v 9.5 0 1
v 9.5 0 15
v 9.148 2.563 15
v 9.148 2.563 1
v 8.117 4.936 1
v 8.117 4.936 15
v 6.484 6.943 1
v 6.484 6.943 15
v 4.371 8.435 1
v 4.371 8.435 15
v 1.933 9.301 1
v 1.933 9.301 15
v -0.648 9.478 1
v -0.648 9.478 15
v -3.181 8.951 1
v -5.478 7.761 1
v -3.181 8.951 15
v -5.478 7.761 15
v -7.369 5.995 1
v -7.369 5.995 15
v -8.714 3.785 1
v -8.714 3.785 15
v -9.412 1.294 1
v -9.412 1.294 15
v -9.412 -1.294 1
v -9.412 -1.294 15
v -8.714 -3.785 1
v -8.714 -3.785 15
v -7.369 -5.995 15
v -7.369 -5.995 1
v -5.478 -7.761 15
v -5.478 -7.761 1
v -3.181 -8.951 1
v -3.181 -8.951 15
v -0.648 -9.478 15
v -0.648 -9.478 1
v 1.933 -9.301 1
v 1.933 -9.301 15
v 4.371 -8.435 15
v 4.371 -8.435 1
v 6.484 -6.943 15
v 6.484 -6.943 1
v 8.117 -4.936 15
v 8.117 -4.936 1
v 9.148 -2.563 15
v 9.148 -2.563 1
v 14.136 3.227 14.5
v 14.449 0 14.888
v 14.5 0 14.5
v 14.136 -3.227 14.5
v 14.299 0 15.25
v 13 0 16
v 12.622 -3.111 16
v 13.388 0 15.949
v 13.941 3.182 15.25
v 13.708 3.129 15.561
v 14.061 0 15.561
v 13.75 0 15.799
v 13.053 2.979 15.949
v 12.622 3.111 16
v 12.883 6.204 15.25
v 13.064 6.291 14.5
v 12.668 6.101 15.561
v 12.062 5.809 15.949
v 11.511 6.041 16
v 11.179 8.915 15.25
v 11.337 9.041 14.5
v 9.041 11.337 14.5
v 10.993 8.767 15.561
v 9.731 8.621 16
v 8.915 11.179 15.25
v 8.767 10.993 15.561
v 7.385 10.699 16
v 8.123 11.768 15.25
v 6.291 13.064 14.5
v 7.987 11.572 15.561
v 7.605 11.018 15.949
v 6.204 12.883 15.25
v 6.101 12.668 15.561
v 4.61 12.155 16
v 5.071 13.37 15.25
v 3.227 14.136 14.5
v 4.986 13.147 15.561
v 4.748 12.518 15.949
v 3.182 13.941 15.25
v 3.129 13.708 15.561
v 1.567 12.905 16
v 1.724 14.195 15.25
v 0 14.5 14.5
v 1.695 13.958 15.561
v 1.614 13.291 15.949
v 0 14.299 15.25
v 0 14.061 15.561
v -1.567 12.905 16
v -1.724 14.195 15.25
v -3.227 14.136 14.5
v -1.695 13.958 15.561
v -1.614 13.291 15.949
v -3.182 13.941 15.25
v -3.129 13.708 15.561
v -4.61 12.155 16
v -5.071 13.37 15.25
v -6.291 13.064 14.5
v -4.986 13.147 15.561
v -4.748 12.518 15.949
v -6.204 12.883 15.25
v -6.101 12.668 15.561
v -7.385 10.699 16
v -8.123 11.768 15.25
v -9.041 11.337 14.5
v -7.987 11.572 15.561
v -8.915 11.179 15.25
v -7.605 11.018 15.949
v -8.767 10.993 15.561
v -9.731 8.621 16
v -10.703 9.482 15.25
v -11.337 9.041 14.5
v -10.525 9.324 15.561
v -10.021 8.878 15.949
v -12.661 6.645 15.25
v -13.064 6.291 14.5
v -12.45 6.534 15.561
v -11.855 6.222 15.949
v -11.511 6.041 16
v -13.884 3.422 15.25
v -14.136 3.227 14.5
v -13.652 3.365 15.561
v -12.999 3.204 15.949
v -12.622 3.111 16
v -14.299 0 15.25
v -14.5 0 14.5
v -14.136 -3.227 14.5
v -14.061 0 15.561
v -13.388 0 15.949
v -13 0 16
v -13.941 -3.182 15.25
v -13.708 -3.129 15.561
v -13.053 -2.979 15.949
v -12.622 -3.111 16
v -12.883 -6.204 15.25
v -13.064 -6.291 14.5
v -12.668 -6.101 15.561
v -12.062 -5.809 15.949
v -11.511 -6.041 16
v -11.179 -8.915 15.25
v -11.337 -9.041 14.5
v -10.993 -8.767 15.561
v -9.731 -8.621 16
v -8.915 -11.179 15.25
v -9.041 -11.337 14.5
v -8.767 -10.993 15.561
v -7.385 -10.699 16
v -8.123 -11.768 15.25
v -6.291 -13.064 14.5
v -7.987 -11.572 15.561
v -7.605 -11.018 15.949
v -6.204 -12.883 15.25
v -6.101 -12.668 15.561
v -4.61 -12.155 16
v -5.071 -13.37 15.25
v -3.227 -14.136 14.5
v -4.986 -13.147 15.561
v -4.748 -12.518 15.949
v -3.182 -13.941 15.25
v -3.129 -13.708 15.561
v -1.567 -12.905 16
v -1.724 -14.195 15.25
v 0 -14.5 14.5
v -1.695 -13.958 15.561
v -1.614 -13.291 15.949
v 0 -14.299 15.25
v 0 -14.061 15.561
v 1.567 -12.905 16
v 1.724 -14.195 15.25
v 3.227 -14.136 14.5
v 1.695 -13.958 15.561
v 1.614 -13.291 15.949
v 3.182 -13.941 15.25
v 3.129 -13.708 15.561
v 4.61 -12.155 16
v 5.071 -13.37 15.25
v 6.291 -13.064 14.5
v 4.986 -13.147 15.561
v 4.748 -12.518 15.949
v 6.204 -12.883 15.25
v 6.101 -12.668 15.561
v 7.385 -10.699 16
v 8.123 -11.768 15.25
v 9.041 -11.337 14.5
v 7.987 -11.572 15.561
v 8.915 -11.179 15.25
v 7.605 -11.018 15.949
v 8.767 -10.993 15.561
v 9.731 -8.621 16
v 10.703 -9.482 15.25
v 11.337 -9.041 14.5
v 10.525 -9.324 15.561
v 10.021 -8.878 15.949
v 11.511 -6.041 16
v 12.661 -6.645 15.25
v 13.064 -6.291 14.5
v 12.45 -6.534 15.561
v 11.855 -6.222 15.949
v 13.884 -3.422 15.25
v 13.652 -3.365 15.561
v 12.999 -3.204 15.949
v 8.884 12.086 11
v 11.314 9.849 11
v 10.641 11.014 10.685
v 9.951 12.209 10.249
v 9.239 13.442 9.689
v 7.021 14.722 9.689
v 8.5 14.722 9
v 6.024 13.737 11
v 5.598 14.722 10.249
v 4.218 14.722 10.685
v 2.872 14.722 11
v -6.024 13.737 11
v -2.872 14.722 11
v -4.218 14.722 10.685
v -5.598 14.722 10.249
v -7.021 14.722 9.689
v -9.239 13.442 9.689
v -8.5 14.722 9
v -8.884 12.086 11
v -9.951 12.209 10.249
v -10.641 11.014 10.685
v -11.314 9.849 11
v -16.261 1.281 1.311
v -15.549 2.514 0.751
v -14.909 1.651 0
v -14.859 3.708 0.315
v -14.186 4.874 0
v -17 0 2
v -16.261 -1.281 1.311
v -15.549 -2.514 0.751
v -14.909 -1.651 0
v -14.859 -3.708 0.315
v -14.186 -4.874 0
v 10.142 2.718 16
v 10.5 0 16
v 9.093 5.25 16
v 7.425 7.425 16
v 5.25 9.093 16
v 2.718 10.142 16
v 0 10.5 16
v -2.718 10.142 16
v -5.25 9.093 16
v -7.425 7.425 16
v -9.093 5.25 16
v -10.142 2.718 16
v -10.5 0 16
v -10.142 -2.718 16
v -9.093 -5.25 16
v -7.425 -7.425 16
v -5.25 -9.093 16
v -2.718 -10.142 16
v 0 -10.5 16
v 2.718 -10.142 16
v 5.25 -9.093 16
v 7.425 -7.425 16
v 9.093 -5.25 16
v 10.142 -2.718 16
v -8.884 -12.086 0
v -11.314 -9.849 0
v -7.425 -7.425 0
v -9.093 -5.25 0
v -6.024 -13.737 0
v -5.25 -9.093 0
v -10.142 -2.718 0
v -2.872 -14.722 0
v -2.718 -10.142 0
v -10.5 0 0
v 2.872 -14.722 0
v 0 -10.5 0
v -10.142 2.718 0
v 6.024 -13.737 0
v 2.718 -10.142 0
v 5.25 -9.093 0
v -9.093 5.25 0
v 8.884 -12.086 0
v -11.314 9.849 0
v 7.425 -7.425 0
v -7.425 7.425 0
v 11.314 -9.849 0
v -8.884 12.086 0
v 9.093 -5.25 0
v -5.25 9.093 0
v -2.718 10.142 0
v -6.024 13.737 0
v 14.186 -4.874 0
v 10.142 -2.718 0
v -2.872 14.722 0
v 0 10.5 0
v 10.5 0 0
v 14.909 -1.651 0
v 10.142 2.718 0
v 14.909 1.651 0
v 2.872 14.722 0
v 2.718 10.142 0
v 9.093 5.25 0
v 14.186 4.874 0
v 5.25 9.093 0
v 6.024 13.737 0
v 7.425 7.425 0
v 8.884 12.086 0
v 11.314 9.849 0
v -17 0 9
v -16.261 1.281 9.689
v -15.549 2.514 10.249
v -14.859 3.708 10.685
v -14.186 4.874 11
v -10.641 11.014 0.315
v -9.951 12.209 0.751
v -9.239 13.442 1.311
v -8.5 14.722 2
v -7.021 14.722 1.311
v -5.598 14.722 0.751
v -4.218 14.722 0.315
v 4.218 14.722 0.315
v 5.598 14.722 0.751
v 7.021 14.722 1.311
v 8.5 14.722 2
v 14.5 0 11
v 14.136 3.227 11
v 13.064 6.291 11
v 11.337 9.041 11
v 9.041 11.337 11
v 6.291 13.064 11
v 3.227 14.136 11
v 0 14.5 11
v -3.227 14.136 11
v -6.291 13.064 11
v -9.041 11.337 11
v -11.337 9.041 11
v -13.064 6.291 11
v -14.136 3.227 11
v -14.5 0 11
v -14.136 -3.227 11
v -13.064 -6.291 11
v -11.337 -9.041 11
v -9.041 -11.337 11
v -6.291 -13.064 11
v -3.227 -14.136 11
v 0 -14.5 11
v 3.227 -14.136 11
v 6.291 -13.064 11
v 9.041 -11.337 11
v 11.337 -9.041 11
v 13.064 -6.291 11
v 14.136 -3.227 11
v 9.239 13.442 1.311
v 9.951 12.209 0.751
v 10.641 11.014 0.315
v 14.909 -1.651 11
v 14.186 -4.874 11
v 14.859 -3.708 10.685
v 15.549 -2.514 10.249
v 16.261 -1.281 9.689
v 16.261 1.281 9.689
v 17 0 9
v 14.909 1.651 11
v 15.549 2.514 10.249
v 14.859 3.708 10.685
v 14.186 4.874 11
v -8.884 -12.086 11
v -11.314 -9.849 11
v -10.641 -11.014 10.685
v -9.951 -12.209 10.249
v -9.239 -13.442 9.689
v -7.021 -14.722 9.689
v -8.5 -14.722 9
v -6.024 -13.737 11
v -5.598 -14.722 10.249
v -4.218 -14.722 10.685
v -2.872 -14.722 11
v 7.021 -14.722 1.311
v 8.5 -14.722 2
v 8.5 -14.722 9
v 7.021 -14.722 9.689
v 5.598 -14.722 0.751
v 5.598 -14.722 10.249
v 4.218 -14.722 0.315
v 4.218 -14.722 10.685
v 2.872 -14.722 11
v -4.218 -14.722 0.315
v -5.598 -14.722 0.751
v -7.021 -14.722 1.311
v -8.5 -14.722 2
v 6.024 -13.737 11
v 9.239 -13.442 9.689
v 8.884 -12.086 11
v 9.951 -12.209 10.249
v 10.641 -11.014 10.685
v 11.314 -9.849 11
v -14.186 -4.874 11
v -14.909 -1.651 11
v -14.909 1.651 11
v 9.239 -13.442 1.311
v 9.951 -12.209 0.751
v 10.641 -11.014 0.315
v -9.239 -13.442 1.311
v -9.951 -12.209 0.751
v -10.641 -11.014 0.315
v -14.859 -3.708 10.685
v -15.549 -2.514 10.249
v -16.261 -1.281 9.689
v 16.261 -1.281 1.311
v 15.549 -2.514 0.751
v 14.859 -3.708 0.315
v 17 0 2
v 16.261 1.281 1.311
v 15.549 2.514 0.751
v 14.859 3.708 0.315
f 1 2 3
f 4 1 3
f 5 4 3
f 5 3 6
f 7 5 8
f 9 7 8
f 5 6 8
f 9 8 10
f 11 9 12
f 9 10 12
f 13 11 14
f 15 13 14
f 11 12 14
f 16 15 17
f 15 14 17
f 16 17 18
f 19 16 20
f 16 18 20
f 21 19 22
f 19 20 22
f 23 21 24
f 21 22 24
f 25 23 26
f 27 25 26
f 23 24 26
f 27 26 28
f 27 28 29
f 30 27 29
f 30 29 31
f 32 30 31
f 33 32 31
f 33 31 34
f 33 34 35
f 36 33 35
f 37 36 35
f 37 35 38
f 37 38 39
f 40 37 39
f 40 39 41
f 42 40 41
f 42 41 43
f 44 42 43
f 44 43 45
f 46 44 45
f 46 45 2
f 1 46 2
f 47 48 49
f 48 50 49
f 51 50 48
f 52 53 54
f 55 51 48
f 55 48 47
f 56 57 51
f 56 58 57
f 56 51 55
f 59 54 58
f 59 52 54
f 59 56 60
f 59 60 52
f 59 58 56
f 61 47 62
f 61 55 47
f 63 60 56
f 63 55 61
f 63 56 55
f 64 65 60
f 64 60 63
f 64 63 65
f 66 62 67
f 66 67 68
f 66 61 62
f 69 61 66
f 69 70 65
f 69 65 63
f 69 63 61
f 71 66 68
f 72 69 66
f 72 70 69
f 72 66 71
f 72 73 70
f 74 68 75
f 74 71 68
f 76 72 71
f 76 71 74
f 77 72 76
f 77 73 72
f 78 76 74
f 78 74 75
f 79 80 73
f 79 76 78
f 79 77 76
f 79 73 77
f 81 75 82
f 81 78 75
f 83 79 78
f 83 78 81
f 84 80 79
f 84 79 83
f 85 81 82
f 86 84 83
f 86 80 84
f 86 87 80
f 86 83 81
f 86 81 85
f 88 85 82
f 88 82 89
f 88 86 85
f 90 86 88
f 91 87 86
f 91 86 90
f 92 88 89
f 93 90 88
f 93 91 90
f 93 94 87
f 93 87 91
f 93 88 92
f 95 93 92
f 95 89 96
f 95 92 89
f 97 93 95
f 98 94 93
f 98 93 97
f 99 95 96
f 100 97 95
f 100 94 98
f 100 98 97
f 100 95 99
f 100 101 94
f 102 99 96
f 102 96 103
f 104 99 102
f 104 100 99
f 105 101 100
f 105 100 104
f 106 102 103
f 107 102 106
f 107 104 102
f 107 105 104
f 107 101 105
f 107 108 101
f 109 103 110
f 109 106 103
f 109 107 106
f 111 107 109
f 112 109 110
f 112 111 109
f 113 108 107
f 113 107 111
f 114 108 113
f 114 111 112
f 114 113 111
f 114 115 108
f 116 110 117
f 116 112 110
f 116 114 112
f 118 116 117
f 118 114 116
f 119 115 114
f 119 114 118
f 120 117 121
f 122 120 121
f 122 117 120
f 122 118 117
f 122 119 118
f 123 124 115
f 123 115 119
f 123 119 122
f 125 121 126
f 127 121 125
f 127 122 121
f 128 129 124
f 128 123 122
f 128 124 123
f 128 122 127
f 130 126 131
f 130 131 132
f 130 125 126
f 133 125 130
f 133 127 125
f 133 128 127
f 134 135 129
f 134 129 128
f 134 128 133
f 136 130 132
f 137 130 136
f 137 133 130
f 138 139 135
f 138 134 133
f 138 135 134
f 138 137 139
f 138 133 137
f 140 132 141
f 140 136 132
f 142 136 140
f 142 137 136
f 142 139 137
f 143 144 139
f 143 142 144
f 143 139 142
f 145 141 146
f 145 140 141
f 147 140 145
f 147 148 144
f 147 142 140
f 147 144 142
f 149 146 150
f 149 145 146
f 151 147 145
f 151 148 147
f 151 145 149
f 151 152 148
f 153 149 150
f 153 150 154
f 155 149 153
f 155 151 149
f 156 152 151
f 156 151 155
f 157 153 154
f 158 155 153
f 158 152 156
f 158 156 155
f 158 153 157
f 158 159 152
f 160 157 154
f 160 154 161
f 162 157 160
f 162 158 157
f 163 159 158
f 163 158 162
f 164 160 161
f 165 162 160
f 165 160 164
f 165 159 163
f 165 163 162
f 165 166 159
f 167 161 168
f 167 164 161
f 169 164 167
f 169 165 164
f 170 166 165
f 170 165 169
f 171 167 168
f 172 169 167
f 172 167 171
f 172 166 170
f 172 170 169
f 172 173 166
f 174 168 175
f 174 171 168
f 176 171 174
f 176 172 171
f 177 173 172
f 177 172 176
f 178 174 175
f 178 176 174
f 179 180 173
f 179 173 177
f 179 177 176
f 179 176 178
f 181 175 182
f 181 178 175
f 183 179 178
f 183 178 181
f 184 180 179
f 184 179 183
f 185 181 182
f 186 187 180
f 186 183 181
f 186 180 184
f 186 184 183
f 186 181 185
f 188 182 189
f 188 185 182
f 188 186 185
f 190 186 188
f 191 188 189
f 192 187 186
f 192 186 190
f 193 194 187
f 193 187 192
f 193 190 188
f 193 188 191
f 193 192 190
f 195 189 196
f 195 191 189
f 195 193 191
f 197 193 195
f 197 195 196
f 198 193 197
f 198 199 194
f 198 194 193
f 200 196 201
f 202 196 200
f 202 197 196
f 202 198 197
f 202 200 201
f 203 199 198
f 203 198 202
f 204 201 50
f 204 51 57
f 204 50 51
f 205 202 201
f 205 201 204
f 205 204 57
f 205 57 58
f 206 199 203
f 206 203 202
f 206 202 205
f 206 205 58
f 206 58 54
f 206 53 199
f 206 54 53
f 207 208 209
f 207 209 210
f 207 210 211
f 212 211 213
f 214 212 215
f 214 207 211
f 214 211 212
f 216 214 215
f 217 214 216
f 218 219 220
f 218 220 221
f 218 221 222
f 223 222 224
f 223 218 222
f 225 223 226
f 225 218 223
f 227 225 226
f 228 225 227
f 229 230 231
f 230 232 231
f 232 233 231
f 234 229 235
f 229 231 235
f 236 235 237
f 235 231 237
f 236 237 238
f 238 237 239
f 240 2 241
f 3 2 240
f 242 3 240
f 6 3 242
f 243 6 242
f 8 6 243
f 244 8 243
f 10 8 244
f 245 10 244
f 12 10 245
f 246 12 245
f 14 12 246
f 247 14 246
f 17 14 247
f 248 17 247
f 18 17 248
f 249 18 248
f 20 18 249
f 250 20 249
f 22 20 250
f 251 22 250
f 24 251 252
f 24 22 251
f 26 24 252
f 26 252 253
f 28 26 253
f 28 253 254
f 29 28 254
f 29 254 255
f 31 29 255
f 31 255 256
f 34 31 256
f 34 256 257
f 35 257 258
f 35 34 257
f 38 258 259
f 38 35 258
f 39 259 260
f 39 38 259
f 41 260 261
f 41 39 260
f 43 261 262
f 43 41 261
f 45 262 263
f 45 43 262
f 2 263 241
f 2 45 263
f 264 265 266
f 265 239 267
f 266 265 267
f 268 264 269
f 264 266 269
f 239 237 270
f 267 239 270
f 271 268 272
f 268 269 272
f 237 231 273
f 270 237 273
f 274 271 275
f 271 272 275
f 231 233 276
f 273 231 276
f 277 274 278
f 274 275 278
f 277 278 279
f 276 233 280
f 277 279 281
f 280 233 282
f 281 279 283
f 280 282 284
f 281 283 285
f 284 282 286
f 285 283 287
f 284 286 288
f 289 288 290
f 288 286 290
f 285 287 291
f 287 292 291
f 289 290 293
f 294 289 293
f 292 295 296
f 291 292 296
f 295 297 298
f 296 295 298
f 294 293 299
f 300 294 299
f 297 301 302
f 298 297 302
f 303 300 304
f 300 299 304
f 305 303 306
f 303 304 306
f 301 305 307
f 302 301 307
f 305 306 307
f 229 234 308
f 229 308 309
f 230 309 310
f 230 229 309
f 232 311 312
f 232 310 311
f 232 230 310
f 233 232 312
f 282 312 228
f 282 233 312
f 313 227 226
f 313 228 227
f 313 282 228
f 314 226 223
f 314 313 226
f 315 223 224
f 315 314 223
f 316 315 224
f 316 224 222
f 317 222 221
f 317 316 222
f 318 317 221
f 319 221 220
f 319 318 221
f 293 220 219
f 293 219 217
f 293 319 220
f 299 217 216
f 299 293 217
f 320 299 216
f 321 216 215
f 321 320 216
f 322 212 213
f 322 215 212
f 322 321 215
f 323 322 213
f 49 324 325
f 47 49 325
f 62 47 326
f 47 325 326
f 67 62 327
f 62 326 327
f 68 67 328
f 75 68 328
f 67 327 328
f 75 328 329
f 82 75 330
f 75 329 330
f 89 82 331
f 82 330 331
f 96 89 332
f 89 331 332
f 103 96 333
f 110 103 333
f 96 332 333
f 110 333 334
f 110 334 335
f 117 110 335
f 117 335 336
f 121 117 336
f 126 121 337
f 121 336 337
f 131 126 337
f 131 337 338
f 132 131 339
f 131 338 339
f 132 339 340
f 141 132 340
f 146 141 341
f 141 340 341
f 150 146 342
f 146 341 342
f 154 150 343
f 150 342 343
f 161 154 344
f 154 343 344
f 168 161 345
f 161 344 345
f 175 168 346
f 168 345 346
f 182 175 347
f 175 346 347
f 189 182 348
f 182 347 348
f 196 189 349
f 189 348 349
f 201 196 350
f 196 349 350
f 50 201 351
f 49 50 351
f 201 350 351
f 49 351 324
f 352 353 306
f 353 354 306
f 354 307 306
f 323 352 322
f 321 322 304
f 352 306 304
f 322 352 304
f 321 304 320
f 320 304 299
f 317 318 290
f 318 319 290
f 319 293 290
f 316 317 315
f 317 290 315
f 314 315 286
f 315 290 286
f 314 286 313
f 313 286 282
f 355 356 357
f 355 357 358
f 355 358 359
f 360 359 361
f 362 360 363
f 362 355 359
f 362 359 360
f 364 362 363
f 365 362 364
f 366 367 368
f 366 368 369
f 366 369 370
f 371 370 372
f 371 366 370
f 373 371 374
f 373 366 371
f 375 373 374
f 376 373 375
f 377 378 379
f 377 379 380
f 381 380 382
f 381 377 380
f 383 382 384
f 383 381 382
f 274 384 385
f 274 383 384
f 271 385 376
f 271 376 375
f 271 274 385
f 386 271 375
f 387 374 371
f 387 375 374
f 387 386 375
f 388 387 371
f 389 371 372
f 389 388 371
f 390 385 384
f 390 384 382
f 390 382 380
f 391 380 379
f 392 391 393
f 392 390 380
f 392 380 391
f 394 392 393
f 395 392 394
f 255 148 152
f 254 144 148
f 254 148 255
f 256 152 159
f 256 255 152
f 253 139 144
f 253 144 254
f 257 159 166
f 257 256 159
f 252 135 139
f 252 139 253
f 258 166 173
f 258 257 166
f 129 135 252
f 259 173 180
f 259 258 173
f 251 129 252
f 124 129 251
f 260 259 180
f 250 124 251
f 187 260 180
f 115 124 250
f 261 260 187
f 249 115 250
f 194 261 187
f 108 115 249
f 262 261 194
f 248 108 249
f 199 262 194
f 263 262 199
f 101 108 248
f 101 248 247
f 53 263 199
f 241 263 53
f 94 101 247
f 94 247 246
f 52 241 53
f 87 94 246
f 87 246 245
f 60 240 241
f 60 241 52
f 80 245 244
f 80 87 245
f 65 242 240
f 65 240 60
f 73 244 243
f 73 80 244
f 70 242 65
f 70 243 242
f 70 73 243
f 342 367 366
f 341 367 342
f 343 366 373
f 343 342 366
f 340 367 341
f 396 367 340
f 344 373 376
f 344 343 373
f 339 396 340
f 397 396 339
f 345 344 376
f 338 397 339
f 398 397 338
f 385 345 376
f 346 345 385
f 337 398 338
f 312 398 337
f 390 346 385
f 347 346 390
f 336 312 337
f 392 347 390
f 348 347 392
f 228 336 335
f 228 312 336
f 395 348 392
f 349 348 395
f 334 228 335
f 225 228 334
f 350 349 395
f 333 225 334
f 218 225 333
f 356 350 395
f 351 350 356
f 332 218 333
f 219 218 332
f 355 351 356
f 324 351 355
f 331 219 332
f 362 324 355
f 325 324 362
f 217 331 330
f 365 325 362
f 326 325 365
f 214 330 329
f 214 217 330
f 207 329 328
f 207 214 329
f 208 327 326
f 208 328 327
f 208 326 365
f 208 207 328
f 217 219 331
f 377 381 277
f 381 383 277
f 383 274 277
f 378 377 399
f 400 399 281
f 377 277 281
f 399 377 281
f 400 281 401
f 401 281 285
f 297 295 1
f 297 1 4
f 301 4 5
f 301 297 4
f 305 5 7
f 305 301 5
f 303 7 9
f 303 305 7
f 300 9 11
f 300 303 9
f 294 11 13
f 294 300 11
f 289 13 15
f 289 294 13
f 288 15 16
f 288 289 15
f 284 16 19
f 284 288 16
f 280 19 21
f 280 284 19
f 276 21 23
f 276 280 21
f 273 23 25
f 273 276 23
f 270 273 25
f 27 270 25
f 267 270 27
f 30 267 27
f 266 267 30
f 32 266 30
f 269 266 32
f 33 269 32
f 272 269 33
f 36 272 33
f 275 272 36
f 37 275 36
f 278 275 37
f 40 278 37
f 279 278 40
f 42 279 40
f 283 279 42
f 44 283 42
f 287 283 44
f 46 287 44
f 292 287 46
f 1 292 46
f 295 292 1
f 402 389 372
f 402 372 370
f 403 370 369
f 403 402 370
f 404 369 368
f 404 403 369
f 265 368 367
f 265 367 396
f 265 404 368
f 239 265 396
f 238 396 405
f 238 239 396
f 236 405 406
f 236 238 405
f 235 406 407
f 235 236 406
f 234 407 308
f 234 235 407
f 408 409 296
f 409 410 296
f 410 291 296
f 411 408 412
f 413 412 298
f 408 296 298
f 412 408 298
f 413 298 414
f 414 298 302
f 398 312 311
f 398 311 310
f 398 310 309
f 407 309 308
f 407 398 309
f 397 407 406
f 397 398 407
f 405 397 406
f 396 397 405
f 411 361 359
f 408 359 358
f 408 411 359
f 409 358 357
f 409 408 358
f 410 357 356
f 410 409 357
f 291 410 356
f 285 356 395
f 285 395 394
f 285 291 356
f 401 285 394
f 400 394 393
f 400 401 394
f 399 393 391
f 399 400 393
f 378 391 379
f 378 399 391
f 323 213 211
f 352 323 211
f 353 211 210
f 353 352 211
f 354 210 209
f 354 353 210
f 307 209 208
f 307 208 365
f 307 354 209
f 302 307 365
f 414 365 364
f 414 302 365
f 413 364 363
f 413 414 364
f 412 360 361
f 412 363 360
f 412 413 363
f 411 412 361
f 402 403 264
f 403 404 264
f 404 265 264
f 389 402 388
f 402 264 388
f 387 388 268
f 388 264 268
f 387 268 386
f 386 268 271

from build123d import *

# Parameters (mm, degrees)
ESQUISSE1_R                  = 17
CORPS_DE_MANOEUVRE_DEPTH     = 11
ESQUISSE2_R                  = 14.5
ORGANE_DE_FREIN_DEPTH        = 5
ESQUISSE3_R                  = 9.5
PER_AGE_DEPTH                = 29.879058156
CHANFREIN_DE_MANOEUVRE_SIZE  = 2
HEXAGON_INSCRIBED1_OUTSIDE_W = 46.136
HEXAGON_INSCRIBED1_OUTSIDE_H = 46.136
MANOEUVRE_DEPTH              = 39.920108467
CONG_1_R                     = 1.5
CHANFREIN2_SIZE              = 1


with BuildPart() as part:
    # Esquisse1 → corps de manoeuvre (new body)
    with BuildSketch(Plane.XY):
        Circle(ESQUISSE1_R)
    extrude(amount=CORPS_DE_MANOEUVRE_DEPTH)

    # Esquisse2 → organe de frein (add)
    with BuildSketch(Plane.XY.offset(11)):
        Circle(ESQUISSE2_R)
    extrude(amount=ORGANE_DE_FREIN_DEPTH)

    # Esquisse3 → perçage (cut, through all)
    with BuildSketch(Plane.XY.offset(16)):
        Circle(ESQUISSE3_R)
    extrude(amount=-PER_AGE_DEPTH, mode=Mode.SUBTRACT)

    # Chanfrein de manoeuvre
    chanfrein_de_manoeuvre_edges = [part.edges().sort_by_distance(p)[0] for p in [
        (-17, 0, 0),
        (-17, 0, 11),
    ]]
    chamfer(chanfrein_de_manoeuvre_edges, length=CHANFREIN_DE_MANOEUVRE_SIZE)

    # Hexagon - inscribed1 outside → manoeuvre (cut, through all)
    with BuildSketch(Plane(origin=(1.77823943, 13.102368129, 0), x_dir=(-1, 0, 0), z_dir=(0, 0, -1))):
        with Locations((1.778, -13.102)):
            Rectangle(HEXAGON_INSCRIBED1_OUTSIDE_W, HEXAGON_INSCRIBED1_OUTSIDE_H)
        Polygon((18.77823943, -13.102368129), (10.27823943, 1.620063735), (-6.72176057, 1.620063735), (-15.22176057, -13.102368129), (-6.72176057, -27.824799994), (10.27823943, -27.824799994), align=None, mode=Mode.SUBTRACT)
    extrude(amount=-MANOEUVRE_DEPTH, mode=Mode.SUBTRACT)

    # Congé1
    cong_1_edges = [part.edges().sort_by_distance(p)[0] for p in [
        (-14.5, 0, 16),
    ]]
    fillet(cong_1_edges, radius=CONG_1_R)

    # Chanfrein2
    chanfrein2_edges = [part.edges().sort_by_distance(p)[0] for p in [
        (-9.5, 0, 16),
        (-9.5, 0, 0),
    ]]
    chamfer(chanfrein2_edges, length=CHANFREIN2_SIZE)


solid = part.part
